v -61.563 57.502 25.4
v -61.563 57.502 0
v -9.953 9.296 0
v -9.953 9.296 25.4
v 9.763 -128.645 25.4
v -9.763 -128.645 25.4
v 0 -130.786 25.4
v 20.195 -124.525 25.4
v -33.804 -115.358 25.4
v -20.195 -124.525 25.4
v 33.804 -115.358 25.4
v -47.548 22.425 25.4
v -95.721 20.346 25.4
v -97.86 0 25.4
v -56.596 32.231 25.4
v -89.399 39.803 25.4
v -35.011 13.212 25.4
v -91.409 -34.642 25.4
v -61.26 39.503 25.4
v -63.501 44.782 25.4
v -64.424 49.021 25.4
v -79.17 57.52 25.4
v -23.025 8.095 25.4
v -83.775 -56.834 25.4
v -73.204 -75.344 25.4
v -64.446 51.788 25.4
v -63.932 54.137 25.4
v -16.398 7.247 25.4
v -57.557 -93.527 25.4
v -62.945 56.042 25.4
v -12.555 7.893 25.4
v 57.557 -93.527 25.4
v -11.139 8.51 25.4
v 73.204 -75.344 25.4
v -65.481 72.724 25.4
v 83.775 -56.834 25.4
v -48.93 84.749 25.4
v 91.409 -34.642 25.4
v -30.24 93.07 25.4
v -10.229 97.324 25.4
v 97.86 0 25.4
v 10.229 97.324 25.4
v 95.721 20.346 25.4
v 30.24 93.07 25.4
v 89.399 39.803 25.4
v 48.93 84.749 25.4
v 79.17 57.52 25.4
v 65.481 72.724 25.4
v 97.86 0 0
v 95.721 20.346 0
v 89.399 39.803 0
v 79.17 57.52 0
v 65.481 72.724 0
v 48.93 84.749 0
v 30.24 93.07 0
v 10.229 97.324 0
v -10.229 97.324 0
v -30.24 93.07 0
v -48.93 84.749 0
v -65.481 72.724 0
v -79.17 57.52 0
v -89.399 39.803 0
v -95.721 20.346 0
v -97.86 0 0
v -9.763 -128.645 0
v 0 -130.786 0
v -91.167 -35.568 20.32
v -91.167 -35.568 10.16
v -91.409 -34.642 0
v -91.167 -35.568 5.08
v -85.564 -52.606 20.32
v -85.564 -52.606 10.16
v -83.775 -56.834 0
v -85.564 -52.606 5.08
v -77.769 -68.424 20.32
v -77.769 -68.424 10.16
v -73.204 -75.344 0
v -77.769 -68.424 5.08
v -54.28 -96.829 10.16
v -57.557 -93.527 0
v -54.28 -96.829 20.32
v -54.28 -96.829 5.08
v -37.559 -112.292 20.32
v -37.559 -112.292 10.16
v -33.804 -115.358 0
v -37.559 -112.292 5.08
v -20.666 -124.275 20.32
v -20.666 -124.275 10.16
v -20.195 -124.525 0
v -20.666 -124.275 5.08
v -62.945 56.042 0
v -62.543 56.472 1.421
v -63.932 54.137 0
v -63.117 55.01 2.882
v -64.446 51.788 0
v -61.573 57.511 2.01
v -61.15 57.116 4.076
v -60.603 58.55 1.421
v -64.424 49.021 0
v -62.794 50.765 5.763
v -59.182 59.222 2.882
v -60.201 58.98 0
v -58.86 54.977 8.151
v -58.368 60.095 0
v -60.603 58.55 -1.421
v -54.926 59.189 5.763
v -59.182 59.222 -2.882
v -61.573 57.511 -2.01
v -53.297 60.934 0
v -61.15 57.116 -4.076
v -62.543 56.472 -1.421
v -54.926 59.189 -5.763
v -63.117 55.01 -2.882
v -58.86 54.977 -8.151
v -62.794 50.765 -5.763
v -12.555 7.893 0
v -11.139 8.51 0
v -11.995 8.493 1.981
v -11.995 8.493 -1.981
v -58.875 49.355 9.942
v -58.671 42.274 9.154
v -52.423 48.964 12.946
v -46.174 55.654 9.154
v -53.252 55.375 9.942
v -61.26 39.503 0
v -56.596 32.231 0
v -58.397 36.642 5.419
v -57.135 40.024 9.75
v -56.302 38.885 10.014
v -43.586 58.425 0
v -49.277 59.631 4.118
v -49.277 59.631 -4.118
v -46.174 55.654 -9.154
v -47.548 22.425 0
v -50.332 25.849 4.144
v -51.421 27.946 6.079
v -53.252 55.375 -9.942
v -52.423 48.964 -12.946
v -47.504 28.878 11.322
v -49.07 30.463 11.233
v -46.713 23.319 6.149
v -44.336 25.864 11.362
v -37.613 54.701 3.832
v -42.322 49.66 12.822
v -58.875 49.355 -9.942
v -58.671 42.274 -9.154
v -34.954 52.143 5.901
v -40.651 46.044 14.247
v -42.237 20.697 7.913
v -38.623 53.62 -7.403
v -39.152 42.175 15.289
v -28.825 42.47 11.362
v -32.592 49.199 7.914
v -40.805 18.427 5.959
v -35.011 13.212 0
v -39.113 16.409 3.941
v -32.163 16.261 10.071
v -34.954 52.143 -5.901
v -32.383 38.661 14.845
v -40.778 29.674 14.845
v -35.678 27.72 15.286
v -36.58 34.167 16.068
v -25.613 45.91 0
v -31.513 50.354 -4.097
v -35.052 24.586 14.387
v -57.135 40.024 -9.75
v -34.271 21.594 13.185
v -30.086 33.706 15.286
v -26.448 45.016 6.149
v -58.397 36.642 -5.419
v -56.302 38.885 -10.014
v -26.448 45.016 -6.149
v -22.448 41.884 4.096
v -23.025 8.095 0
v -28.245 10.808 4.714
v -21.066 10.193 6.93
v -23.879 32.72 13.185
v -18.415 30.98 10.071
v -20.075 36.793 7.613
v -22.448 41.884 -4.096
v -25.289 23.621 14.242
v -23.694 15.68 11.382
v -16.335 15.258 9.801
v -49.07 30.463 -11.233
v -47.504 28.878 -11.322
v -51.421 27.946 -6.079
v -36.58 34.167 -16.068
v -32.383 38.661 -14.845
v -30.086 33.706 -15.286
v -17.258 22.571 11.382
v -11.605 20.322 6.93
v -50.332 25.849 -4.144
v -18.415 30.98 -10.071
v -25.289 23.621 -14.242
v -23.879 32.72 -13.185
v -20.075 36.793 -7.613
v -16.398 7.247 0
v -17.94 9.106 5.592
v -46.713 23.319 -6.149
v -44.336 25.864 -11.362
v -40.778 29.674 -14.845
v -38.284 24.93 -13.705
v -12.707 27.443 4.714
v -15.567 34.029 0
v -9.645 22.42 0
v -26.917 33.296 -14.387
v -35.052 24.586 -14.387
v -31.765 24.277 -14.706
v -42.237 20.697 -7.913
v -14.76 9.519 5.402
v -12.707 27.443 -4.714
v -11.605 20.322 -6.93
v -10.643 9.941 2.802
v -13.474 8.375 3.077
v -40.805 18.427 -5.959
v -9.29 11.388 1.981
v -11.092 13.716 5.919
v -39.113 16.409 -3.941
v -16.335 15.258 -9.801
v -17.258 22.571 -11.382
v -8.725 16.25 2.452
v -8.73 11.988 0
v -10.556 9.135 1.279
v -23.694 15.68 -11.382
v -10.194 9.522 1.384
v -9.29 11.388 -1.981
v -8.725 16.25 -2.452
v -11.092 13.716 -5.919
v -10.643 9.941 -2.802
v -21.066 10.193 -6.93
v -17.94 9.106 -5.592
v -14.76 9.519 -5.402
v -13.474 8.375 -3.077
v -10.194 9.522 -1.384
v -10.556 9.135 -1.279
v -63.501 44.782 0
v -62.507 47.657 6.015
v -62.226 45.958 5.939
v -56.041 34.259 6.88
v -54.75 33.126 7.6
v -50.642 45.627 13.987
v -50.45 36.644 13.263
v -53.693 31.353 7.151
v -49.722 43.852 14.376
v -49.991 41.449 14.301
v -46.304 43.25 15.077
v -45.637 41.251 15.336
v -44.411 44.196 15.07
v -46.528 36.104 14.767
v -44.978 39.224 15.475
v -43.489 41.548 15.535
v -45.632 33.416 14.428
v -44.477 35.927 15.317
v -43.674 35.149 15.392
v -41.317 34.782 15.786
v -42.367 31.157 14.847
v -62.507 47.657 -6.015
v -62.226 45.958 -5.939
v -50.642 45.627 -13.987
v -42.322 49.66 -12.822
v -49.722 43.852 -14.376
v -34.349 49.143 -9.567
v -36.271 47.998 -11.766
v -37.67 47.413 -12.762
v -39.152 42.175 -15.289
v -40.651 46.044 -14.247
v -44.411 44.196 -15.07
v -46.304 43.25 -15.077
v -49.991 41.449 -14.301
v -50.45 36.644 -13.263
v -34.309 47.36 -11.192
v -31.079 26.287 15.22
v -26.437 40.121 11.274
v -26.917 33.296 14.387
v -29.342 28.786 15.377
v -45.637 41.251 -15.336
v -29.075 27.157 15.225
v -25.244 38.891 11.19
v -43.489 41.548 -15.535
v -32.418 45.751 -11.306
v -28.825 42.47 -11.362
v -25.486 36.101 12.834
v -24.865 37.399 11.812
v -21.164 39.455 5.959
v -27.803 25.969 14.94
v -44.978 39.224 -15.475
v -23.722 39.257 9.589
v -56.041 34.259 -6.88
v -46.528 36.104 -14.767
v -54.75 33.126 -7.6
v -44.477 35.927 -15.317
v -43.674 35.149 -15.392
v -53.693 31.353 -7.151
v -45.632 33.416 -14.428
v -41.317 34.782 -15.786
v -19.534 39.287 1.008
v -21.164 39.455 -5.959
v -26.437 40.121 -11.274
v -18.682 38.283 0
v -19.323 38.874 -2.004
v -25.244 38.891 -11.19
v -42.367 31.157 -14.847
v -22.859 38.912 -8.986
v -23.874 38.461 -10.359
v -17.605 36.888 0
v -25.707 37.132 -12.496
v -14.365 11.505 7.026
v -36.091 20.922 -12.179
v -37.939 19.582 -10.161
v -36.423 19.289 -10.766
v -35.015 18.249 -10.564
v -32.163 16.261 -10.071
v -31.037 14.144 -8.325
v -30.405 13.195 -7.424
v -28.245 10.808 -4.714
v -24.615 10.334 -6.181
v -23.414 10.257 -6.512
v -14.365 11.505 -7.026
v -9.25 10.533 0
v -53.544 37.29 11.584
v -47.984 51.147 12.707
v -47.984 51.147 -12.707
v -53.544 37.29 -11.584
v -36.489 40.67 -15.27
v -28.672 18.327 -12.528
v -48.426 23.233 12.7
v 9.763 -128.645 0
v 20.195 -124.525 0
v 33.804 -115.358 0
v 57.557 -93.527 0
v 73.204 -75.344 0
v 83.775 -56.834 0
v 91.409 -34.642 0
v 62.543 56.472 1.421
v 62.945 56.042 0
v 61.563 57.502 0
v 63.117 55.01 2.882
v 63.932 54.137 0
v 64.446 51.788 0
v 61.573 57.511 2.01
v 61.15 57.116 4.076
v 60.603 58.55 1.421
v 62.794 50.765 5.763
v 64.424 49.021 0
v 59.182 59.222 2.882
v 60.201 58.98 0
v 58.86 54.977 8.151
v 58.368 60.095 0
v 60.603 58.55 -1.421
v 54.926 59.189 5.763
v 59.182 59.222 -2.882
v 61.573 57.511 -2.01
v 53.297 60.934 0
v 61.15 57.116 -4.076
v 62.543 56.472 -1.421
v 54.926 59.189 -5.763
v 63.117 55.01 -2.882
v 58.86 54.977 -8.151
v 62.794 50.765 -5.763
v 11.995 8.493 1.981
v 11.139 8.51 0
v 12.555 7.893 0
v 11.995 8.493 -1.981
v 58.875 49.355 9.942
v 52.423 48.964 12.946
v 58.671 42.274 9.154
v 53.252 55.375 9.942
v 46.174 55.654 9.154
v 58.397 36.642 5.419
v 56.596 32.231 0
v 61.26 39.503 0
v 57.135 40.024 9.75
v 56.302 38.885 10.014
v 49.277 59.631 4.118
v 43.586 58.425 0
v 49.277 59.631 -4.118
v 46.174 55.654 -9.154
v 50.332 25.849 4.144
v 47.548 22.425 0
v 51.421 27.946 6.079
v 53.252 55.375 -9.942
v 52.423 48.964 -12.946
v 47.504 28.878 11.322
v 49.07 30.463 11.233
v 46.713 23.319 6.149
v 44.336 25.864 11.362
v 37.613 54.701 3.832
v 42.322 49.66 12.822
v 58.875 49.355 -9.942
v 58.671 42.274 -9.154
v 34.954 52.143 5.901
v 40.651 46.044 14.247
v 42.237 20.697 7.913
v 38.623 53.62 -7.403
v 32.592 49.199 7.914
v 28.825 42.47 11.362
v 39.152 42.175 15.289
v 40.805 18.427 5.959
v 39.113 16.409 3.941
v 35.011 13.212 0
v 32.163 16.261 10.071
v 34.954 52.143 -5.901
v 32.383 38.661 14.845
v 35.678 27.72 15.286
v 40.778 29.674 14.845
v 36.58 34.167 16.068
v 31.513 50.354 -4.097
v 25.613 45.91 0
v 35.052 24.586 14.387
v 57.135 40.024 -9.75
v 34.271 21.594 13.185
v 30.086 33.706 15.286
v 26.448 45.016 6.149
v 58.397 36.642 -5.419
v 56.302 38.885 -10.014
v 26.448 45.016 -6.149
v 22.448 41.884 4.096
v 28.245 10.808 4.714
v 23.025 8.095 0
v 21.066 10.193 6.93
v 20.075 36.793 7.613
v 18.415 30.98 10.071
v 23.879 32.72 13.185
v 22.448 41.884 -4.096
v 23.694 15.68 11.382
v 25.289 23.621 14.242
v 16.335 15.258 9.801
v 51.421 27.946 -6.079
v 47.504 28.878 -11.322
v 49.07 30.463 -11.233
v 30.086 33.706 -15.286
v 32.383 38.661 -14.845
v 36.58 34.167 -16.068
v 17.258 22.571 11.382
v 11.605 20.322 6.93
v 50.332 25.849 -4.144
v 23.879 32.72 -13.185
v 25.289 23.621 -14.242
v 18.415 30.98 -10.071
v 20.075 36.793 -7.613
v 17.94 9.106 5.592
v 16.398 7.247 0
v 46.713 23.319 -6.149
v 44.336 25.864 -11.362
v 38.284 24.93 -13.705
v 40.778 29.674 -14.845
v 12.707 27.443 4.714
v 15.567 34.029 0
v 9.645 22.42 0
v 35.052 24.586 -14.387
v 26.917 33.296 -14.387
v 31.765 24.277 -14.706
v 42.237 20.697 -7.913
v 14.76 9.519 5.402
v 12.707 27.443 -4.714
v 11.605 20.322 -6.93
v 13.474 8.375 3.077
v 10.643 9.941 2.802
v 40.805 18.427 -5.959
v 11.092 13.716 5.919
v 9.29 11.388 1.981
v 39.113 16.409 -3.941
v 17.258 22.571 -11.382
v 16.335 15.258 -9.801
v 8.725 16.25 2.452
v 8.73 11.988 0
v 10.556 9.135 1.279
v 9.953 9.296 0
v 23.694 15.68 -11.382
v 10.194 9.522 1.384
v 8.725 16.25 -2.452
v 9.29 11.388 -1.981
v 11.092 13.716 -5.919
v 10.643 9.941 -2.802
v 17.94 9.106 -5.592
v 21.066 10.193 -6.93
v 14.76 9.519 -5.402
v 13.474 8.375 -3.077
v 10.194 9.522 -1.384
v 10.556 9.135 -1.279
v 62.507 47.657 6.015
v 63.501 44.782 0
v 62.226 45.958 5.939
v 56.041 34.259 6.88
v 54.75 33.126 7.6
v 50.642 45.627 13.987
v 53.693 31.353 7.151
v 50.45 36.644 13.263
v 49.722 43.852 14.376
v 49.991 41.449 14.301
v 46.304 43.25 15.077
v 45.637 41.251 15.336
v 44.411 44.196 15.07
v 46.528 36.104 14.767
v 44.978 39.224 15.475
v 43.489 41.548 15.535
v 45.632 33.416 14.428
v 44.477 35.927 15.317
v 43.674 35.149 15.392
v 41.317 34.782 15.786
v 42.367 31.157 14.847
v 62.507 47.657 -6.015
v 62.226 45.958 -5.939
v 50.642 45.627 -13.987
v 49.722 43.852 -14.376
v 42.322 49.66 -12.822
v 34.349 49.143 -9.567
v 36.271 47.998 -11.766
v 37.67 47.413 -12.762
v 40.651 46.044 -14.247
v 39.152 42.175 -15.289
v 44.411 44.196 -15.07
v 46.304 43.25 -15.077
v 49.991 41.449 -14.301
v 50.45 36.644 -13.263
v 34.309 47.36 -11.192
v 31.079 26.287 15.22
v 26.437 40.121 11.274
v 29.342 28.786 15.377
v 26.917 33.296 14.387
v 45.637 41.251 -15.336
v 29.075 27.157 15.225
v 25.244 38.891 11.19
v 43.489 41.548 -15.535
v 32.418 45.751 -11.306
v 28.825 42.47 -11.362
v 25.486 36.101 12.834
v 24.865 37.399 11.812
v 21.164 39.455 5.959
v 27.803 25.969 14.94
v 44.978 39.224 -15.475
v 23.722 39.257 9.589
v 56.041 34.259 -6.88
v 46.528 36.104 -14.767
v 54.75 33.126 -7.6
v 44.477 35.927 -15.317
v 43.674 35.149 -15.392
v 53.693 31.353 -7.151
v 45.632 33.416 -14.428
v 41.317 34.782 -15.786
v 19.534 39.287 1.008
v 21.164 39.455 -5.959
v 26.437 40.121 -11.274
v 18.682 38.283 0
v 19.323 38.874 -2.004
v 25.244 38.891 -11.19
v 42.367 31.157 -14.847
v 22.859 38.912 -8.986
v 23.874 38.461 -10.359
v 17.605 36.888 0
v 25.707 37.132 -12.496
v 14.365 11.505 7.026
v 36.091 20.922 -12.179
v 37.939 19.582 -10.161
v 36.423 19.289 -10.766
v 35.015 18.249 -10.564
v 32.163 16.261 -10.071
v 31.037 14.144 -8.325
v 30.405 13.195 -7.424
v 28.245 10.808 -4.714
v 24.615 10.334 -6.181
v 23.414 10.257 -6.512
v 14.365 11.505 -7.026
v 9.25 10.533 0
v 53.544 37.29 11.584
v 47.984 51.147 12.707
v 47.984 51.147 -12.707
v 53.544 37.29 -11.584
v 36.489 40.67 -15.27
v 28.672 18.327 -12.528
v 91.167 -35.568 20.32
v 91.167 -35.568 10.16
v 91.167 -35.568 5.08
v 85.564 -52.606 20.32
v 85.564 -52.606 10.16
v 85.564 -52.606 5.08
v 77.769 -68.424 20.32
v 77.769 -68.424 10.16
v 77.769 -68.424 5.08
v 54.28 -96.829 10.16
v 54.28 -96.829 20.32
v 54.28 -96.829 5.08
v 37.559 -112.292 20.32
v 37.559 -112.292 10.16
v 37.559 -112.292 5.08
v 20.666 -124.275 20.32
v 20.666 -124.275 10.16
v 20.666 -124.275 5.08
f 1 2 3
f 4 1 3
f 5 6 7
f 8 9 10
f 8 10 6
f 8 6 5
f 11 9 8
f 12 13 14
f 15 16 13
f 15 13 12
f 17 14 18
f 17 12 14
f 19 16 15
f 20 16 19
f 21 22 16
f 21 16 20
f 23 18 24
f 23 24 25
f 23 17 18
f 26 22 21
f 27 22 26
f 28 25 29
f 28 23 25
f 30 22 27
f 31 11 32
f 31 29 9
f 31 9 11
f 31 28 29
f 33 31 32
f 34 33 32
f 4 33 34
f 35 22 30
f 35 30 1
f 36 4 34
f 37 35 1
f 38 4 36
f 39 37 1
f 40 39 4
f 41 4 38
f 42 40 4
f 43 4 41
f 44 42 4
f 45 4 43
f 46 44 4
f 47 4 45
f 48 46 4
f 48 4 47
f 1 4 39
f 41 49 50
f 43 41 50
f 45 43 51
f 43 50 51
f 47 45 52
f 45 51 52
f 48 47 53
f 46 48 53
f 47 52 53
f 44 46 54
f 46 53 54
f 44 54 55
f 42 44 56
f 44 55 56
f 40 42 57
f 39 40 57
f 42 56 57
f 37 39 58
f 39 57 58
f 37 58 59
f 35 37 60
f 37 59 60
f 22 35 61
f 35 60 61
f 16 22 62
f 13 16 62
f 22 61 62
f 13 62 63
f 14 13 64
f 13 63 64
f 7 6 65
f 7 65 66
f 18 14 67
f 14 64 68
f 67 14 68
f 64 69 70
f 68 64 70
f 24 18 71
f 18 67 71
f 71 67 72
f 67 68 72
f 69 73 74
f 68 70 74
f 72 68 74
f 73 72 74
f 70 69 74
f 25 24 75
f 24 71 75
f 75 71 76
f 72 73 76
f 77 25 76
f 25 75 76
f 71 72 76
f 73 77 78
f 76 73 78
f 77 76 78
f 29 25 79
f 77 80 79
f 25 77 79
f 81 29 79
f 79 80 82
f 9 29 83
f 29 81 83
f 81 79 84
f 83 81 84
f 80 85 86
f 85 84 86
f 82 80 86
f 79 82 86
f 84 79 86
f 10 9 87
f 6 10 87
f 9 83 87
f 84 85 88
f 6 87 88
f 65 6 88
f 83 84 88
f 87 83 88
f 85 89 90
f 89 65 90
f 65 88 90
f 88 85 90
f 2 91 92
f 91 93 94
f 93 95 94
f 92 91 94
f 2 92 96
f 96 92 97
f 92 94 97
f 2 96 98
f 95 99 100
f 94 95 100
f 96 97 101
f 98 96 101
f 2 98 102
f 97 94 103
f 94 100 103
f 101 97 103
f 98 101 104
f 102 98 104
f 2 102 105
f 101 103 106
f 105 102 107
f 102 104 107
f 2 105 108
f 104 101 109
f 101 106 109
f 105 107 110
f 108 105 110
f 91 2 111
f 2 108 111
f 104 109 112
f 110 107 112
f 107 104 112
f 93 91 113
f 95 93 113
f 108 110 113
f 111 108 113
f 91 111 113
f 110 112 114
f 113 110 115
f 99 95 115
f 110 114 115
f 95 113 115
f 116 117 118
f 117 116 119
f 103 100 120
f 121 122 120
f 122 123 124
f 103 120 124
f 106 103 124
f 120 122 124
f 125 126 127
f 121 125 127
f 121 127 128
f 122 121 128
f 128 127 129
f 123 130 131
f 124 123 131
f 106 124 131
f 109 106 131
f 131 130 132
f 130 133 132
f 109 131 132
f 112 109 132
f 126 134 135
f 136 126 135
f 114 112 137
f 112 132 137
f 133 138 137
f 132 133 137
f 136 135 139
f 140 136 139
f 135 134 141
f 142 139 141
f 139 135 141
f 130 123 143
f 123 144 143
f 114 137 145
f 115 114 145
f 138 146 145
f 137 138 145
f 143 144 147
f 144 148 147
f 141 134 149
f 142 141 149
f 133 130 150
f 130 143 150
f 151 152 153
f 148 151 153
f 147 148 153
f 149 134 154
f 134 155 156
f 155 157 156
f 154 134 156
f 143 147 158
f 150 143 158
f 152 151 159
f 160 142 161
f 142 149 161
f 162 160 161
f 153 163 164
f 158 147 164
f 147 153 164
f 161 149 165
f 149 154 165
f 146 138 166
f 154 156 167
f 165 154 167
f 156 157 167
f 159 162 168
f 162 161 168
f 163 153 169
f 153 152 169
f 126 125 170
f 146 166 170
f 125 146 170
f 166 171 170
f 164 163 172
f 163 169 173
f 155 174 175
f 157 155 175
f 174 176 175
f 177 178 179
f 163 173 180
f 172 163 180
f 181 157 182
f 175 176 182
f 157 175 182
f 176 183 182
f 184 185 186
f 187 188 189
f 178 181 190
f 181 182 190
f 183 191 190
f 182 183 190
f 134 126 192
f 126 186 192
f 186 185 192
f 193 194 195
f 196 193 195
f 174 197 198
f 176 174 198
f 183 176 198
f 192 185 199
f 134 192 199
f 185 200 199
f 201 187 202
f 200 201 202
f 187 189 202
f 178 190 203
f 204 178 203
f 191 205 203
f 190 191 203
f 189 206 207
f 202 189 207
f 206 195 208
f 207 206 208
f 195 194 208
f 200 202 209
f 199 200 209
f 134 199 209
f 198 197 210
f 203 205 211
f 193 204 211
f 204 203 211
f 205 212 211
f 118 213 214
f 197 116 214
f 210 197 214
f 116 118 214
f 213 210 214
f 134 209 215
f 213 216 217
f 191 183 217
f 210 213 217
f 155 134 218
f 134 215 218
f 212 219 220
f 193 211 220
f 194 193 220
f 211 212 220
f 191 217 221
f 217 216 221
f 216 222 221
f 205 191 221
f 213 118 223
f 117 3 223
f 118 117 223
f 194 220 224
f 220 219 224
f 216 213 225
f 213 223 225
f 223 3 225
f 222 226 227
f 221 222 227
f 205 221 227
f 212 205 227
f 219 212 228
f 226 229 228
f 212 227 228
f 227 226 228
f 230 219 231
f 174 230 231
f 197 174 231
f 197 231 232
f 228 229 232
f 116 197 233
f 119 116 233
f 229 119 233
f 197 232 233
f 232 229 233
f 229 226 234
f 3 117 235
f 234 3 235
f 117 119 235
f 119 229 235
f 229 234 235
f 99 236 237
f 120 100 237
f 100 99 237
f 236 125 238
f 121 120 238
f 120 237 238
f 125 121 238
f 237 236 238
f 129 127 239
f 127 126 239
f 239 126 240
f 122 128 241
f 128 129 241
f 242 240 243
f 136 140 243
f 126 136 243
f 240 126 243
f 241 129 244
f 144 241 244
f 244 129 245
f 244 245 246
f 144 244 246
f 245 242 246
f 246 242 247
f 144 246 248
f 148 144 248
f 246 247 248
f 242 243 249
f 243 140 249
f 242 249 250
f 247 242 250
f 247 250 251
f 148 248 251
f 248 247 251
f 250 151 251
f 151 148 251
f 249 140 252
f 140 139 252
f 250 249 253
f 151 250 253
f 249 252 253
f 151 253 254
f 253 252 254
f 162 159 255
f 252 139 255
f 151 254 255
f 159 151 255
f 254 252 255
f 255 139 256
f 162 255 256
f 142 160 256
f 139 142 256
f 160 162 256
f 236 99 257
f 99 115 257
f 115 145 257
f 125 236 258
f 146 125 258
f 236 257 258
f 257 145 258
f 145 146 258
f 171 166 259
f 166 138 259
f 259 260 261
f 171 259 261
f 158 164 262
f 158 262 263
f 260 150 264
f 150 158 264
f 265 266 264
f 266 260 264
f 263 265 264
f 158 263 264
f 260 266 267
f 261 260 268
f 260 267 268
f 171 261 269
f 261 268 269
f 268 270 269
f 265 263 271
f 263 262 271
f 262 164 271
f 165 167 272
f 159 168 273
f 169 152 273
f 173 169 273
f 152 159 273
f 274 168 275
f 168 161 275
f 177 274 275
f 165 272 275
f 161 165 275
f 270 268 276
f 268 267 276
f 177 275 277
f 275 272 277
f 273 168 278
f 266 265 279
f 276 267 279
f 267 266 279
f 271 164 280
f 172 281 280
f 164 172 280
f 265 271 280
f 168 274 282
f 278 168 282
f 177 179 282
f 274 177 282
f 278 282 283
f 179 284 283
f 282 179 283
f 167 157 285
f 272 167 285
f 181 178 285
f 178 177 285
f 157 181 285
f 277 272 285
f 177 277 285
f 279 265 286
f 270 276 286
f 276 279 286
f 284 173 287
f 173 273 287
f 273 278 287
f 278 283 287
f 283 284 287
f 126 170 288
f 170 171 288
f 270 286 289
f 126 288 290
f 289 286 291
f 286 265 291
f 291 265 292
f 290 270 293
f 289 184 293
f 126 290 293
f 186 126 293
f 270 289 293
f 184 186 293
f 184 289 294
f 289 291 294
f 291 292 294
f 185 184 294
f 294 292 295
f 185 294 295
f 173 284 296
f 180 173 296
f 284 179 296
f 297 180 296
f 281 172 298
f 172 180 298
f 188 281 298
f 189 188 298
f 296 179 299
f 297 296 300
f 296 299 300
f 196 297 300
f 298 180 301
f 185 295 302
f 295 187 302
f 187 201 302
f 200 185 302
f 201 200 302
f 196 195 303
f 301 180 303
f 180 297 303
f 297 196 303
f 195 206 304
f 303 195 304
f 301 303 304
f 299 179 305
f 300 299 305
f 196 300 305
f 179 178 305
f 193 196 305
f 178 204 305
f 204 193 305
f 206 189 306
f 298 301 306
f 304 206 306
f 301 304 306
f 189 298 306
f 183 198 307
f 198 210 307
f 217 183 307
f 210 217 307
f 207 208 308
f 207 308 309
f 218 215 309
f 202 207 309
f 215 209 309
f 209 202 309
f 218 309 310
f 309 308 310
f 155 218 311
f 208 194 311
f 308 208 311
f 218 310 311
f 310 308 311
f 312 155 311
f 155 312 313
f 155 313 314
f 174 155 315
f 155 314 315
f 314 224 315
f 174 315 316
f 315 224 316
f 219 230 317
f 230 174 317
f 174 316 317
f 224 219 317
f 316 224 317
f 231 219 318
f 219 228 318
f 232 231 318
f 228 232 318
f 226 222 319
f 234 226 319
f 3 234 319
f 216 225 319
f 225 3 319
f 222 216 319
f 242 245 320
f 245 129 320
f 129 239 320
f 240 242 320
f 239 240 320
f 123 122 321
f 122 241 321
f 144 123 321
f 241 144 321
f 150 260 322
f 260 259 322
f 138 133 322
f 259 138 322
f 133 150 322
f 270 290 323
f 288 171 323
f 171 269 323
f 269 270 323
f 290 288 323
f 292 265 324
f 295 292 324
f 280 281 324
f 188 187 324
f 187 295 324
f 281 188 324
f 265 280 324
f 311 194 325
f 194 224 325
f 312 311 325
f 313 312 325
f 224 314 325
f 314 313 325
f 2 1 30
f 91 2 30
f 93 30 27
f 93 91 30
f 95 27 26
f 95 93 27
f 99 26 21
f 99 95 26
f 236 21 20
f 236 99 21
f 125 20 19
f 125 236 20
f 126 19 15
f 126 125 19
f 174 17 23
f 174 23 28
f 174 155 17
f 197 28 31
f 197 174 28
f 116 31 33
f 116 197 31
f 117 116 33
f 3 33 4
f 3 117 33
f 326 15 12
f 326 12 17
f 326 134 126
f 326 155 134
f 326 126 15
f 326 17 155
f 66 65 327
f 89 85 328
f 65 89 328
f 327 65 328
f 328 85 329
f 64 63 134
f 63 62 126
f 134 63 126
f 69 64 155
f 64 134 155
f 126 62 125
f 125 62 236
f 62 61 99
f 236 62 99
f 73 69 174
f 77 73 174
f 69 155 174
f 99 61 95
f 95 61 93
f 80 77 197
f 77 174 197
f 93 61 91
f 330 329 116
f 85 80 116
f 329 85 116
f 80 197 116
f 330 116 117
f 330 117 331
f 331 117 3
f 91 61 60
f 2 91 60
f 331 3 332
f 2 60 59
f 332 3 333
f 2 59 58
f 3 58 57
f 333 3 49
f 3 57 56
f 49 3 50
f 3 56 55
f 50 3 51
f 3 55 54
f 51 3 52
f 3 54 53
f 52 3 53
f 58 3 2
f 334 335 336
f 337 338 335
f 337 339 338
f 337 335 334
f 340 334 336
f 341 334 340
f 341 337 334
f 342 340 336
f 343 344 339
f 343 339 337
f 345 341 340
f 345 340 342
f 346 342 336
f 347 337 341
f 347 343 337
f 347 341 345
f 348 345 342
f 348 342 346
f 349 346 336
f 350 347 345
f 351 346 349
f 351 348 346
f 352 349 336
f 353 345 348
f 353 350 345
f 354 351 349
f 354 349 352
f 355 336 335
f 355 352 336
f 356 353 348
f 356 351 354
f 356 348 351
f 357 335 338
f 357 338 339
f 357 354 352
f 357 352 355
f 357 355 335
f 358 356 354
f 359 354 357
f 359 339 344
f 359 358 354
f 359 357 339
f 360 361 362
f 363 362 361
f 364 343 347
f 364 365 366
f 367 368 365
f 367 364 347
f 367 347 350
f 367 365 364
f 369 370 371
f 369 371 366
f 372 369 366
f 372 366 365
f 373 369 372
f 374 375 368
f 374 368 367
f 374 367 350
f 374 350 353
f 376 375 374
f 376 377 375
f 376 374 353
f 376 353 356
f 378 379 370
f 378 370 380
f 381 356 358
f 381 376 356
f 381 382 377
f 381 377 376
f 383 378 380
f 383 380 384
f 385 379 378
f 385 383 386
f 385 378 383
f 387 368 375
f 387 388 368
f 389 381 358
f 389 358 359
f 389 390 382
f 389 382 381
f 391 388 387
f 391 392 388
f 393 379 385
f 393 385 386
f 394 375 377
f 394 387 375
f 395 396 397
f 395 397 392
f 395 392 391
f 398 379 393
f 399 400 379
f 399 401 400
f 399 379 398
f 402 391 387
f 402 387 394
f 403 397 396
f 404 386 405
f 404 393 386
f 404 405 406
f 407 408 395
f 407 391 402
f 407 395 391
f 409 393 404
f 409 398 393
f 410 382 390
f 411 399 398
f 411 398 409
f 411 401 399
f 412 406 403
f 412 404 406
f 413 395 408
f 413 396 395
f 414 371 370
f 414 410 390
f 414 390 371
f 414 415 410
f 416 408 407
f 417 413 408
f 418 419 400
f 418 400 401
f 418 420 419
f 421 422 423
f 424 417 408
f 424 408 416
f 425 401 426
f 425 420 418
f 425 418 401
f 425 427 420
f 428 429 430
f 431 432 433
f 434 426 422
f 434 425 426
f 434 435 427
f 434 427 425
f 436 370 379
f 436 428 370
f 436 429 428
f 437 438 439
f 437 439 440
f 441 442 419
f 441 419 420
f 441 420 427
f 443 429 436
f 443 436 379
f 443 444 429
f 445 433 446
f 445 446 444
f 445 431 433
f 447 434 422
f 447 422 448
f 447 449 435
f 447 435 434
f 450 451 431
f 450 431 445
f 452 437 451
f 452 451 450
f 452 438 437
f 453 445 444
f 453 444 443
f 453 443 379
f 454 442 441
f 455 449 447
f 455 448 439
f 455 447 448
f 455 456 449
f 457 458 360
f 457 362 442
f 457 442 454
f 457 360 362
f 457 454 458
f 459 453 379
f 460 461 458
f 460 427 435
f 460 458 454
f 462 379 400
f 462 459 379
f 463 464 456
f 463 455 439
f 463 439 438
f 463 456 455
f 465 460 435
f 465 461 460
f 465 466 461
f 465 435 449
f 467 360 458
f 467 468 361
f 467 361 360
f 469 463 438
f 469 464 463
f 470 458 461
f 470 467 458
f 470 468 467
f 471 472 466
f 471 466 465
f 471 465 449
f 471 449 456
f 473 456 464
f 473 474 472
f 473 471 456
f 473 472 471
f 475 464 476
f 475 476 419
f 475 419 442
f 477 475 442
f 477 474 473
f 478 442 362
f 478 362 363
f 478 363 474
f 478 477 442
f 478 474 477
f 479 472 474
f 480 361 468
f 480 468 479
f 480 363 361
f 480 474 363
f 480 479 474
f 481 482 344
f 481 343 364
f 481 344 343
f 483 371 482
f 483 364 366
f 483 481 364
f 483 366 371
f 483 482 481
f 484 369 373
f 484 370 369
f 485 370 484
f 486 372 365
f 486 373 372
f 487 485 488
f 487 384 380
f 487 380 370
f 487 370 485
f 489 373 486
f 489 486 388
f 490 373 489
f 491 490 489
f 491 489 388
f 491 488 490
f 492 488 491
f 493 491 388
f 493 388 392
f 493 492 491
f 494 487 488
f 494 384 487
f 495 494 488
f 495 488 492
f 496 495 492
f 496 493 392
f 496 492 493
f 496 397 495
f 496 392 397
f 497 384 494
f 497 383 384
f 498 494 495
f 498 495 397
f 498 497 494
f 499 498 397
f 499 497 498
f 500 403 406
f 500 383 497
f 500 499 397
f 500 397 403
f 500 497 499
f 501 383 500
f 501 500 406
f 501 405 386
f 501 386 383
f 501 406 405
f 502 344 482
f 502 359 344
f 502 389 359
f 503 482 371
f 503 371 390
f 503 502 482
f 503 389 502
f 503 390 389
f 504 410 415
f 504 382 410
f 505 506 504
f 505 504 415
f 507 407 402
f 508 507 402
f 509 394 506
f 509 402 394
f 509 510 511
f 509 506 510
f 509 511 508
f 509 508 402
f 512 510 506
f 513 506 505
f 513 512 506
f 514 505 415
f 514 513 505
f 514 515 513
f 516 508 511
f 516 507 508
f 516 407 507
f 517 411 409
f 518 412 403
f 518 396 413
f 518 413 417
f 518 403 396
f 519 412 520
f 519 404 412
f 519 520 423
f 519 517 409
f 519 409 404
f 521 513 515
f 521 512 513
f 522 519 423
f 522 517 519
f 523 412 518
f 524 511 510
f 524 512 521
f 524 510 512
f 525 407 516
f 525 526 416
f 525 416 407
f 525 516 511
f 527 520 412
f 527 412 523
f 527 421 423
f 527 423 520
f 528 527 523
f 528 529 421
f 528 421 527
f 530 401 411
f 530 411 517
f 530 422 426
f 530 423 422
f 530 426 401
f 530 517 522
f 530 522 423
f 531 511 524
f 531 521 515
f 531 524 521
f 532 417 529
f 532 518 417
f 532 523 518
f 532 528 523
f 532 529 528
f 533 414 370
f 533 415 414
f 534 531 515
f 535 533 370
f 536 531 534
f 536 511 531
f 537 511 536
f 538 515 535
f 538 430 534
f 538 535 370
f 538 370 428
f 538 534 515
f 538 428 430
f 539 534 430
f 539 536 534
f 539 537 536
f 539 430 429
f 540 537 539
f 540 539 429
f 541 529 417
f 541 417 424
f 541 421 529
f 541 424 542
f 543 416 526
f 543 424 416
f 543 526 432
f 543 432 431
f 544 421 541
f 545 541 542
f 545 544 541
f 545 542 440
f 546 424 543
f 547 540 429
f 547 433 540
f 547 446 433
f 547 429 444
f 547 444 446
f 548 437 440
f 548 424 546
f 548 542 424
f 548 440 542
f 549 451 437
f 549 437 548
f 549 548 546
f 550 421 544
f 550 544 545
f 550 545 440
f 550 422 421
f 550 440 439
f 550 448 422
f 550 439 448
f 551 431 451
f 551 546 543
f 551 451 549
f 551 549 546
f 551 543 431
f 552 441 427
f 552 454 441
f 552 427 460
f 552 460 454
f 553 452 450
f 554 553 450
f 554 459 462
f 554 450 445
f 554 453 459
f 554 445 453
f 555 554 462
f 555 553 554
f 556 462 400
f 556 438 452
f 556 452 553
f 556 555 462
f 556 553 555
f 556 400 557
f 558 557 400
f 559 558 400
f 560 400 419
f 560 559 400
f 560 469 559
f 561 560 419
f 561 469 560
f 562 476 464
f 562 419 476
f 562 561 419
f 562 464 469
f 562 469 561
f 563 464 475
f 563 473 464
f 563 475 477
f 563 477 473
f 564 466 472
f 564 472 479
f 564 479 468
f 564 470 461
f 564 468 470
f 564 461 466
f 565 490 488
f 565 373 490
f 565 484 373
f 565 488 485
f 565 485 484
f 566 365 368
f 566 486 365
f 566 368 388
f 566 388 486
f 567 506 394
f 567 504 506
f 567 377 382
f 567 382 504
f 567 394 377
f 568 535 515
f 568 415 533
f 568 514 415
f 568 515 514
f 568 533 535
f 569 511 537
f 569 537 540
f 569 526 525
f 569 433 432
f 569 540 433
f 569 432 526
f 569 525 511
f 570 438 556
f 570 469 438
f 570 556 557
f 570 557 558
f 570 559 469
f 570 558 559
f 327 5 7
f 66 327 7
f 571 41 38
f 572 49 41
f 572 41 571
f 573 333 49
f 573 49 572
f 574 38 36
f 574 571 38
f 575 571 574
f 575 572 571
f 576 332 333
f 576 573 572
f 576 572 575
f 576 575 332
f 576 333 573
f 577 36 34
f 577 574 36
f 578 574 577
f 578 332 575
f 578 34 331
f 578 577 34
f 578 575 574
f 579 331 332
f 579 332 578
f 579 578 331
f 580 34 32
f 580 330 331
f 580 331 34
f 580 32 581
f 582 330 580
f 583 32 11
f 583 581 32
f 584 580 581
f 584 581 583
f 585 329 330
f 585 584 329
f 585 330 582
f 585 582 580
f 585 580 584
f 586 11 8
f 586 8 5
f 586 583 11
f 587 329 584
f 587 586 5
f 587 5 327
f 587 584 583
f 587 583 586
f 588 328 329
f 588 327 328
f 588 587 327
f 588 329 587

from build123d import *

# Parameters (mm, degrees)
F3_DEPTH = 25.4


with BuildPart() as f1:
    # F0 (on Top) → F1 (revolve)
    with BuildSketch(Plane.XY):
        with BuildLine():
            Line((-9.9525216629, 9.2959710391), (-61.5633883725, 57.502158223))
            add(Edge.make_bspline(
                [(-61.5633883725, 57.502158223), (-74.2319049125, 47.3361252787), (-48.4264715577, 23.2330316867), (-22.6210382029, -0.8700619052), (-9.9525216629, 9.2959710391)],
                knots=[6.2006468794, 6.2006468794, 6.2006468794, 7.7714432062, 7.7714432062, 9.342239533, 9.342239533, 9.342239533], degree=2, weights=[1, 0.7071067812, 1, 0.7071067812, 1]))
        make_face()
    revolve(axis=Axis((-35.7579550177, 33.399064631, 0), (-0.7308006287, 0.6825909764, 0)))


with BuildPart() as f2_1:
    # F2: instance of F1
    add(f1.part.mirror(Plane.YZ))


with BuildPart() as f3:
    # F0 (on Top) → F3 (new body)
    with BuildSketch(Plane.XY):
        with BuildLine():
            Line((0, 0), (0, 97.8596722921))
            ThreePointArc((0, 97.8596722921), (-38.9850767718, 89.7590065131), (-71.5159100355, 66.7981292621))
            Line((-71.5159100355, 66.7981292621), (-61.5633883725, 57.502158223))
            Line((-61.5633883725, 57.502158223), (-9.9525216629, 9.2959710391))
            Line((-9.9525216629, 9.2959710391), (0, 0))
        make_face()
        with BuildLine():
            ThreePointArc((97.8596722921, 0), (69.1972378824, 69.1972378824), (0, 97.8596722921))
            Line((0, 97.8596722921), (0, 0))
            Line((0, 0), (0, -130.7861357927))
            add(Edge.make_bspline(
                [(97.8596722921, 0), (96.0268468146, -11.9272951744), (92.5053784341, -35.7053882501), (79.3134540192, -70.0190893438), (55.4290042275, -96.7287402044), (22.4434714007, -126.5741021306), (6.5719517026, -129.5530993253), (0, -130.7861357927)],
                knots=[0, 0, 0, 0, 0.2054206984, 0.4088183981, 0.616122195, 0.8410568868, 1, 1, 1, 1], degree=3))
        make_face()
        with BuildLine():
            Line((-61.5633883725, 57.502158223), (-71.5159100355, 66.7981292621))
            ThreePointArc((-71.5159100355, 66.7981292621), (-91.0358143284, 35.9025900276), (-97.8596722921, 0))
            Line((-97.8596722921, 0), (0, 0))
            Line((0, 0), (-9.9525216629, 9.2959710391))
            add(Edge.make_bspline(
                [(-61.5633883725, 57.502158223), (-74.2319049125, 47.3361252787), (-48.4264715577, 23.2330316867), (-22.6210382029, -0.8700619052), (-9.9525216629, 9.2959710391)],
                knots=[6.2006468794, 6.2006468794, 6.2006468794, 7.7714432062, 7.7714432062, 9.342239533, 9.342239533, 9.342239533], degree=2, weights=[1, 0.7071067812, 1, 0.7071067812, 1]))
        make_face()
        with BuildLine():
            Line((0, -130.7861357927), (0, 0))
            Line((0, 0), (-97.8596722921, 0))
            add(Edge.make_bspline(
                [(-97.8596722921, 0), (-96.0268468146, -11.9272951744), (-92.5053784341, -35.7053882501), (-79.3134540192, -70.0190893438), (-55.4290042275, -96.7287402044), (-22.4434714007, -126.5741021306), (-6.5719517026, -129.5530993253), (0, -130.7861357927)],
                knots=[0, 0, 0, 0, 0.2054206984, 0.4088183981, 0.616122195, 0.8410568868, 1, 1, 1, 1], degree=3))
        make_face()
    extrude(amount=F3_DEPTH)


solid = Compound([f1.part, f2_1.part, f3.part])
